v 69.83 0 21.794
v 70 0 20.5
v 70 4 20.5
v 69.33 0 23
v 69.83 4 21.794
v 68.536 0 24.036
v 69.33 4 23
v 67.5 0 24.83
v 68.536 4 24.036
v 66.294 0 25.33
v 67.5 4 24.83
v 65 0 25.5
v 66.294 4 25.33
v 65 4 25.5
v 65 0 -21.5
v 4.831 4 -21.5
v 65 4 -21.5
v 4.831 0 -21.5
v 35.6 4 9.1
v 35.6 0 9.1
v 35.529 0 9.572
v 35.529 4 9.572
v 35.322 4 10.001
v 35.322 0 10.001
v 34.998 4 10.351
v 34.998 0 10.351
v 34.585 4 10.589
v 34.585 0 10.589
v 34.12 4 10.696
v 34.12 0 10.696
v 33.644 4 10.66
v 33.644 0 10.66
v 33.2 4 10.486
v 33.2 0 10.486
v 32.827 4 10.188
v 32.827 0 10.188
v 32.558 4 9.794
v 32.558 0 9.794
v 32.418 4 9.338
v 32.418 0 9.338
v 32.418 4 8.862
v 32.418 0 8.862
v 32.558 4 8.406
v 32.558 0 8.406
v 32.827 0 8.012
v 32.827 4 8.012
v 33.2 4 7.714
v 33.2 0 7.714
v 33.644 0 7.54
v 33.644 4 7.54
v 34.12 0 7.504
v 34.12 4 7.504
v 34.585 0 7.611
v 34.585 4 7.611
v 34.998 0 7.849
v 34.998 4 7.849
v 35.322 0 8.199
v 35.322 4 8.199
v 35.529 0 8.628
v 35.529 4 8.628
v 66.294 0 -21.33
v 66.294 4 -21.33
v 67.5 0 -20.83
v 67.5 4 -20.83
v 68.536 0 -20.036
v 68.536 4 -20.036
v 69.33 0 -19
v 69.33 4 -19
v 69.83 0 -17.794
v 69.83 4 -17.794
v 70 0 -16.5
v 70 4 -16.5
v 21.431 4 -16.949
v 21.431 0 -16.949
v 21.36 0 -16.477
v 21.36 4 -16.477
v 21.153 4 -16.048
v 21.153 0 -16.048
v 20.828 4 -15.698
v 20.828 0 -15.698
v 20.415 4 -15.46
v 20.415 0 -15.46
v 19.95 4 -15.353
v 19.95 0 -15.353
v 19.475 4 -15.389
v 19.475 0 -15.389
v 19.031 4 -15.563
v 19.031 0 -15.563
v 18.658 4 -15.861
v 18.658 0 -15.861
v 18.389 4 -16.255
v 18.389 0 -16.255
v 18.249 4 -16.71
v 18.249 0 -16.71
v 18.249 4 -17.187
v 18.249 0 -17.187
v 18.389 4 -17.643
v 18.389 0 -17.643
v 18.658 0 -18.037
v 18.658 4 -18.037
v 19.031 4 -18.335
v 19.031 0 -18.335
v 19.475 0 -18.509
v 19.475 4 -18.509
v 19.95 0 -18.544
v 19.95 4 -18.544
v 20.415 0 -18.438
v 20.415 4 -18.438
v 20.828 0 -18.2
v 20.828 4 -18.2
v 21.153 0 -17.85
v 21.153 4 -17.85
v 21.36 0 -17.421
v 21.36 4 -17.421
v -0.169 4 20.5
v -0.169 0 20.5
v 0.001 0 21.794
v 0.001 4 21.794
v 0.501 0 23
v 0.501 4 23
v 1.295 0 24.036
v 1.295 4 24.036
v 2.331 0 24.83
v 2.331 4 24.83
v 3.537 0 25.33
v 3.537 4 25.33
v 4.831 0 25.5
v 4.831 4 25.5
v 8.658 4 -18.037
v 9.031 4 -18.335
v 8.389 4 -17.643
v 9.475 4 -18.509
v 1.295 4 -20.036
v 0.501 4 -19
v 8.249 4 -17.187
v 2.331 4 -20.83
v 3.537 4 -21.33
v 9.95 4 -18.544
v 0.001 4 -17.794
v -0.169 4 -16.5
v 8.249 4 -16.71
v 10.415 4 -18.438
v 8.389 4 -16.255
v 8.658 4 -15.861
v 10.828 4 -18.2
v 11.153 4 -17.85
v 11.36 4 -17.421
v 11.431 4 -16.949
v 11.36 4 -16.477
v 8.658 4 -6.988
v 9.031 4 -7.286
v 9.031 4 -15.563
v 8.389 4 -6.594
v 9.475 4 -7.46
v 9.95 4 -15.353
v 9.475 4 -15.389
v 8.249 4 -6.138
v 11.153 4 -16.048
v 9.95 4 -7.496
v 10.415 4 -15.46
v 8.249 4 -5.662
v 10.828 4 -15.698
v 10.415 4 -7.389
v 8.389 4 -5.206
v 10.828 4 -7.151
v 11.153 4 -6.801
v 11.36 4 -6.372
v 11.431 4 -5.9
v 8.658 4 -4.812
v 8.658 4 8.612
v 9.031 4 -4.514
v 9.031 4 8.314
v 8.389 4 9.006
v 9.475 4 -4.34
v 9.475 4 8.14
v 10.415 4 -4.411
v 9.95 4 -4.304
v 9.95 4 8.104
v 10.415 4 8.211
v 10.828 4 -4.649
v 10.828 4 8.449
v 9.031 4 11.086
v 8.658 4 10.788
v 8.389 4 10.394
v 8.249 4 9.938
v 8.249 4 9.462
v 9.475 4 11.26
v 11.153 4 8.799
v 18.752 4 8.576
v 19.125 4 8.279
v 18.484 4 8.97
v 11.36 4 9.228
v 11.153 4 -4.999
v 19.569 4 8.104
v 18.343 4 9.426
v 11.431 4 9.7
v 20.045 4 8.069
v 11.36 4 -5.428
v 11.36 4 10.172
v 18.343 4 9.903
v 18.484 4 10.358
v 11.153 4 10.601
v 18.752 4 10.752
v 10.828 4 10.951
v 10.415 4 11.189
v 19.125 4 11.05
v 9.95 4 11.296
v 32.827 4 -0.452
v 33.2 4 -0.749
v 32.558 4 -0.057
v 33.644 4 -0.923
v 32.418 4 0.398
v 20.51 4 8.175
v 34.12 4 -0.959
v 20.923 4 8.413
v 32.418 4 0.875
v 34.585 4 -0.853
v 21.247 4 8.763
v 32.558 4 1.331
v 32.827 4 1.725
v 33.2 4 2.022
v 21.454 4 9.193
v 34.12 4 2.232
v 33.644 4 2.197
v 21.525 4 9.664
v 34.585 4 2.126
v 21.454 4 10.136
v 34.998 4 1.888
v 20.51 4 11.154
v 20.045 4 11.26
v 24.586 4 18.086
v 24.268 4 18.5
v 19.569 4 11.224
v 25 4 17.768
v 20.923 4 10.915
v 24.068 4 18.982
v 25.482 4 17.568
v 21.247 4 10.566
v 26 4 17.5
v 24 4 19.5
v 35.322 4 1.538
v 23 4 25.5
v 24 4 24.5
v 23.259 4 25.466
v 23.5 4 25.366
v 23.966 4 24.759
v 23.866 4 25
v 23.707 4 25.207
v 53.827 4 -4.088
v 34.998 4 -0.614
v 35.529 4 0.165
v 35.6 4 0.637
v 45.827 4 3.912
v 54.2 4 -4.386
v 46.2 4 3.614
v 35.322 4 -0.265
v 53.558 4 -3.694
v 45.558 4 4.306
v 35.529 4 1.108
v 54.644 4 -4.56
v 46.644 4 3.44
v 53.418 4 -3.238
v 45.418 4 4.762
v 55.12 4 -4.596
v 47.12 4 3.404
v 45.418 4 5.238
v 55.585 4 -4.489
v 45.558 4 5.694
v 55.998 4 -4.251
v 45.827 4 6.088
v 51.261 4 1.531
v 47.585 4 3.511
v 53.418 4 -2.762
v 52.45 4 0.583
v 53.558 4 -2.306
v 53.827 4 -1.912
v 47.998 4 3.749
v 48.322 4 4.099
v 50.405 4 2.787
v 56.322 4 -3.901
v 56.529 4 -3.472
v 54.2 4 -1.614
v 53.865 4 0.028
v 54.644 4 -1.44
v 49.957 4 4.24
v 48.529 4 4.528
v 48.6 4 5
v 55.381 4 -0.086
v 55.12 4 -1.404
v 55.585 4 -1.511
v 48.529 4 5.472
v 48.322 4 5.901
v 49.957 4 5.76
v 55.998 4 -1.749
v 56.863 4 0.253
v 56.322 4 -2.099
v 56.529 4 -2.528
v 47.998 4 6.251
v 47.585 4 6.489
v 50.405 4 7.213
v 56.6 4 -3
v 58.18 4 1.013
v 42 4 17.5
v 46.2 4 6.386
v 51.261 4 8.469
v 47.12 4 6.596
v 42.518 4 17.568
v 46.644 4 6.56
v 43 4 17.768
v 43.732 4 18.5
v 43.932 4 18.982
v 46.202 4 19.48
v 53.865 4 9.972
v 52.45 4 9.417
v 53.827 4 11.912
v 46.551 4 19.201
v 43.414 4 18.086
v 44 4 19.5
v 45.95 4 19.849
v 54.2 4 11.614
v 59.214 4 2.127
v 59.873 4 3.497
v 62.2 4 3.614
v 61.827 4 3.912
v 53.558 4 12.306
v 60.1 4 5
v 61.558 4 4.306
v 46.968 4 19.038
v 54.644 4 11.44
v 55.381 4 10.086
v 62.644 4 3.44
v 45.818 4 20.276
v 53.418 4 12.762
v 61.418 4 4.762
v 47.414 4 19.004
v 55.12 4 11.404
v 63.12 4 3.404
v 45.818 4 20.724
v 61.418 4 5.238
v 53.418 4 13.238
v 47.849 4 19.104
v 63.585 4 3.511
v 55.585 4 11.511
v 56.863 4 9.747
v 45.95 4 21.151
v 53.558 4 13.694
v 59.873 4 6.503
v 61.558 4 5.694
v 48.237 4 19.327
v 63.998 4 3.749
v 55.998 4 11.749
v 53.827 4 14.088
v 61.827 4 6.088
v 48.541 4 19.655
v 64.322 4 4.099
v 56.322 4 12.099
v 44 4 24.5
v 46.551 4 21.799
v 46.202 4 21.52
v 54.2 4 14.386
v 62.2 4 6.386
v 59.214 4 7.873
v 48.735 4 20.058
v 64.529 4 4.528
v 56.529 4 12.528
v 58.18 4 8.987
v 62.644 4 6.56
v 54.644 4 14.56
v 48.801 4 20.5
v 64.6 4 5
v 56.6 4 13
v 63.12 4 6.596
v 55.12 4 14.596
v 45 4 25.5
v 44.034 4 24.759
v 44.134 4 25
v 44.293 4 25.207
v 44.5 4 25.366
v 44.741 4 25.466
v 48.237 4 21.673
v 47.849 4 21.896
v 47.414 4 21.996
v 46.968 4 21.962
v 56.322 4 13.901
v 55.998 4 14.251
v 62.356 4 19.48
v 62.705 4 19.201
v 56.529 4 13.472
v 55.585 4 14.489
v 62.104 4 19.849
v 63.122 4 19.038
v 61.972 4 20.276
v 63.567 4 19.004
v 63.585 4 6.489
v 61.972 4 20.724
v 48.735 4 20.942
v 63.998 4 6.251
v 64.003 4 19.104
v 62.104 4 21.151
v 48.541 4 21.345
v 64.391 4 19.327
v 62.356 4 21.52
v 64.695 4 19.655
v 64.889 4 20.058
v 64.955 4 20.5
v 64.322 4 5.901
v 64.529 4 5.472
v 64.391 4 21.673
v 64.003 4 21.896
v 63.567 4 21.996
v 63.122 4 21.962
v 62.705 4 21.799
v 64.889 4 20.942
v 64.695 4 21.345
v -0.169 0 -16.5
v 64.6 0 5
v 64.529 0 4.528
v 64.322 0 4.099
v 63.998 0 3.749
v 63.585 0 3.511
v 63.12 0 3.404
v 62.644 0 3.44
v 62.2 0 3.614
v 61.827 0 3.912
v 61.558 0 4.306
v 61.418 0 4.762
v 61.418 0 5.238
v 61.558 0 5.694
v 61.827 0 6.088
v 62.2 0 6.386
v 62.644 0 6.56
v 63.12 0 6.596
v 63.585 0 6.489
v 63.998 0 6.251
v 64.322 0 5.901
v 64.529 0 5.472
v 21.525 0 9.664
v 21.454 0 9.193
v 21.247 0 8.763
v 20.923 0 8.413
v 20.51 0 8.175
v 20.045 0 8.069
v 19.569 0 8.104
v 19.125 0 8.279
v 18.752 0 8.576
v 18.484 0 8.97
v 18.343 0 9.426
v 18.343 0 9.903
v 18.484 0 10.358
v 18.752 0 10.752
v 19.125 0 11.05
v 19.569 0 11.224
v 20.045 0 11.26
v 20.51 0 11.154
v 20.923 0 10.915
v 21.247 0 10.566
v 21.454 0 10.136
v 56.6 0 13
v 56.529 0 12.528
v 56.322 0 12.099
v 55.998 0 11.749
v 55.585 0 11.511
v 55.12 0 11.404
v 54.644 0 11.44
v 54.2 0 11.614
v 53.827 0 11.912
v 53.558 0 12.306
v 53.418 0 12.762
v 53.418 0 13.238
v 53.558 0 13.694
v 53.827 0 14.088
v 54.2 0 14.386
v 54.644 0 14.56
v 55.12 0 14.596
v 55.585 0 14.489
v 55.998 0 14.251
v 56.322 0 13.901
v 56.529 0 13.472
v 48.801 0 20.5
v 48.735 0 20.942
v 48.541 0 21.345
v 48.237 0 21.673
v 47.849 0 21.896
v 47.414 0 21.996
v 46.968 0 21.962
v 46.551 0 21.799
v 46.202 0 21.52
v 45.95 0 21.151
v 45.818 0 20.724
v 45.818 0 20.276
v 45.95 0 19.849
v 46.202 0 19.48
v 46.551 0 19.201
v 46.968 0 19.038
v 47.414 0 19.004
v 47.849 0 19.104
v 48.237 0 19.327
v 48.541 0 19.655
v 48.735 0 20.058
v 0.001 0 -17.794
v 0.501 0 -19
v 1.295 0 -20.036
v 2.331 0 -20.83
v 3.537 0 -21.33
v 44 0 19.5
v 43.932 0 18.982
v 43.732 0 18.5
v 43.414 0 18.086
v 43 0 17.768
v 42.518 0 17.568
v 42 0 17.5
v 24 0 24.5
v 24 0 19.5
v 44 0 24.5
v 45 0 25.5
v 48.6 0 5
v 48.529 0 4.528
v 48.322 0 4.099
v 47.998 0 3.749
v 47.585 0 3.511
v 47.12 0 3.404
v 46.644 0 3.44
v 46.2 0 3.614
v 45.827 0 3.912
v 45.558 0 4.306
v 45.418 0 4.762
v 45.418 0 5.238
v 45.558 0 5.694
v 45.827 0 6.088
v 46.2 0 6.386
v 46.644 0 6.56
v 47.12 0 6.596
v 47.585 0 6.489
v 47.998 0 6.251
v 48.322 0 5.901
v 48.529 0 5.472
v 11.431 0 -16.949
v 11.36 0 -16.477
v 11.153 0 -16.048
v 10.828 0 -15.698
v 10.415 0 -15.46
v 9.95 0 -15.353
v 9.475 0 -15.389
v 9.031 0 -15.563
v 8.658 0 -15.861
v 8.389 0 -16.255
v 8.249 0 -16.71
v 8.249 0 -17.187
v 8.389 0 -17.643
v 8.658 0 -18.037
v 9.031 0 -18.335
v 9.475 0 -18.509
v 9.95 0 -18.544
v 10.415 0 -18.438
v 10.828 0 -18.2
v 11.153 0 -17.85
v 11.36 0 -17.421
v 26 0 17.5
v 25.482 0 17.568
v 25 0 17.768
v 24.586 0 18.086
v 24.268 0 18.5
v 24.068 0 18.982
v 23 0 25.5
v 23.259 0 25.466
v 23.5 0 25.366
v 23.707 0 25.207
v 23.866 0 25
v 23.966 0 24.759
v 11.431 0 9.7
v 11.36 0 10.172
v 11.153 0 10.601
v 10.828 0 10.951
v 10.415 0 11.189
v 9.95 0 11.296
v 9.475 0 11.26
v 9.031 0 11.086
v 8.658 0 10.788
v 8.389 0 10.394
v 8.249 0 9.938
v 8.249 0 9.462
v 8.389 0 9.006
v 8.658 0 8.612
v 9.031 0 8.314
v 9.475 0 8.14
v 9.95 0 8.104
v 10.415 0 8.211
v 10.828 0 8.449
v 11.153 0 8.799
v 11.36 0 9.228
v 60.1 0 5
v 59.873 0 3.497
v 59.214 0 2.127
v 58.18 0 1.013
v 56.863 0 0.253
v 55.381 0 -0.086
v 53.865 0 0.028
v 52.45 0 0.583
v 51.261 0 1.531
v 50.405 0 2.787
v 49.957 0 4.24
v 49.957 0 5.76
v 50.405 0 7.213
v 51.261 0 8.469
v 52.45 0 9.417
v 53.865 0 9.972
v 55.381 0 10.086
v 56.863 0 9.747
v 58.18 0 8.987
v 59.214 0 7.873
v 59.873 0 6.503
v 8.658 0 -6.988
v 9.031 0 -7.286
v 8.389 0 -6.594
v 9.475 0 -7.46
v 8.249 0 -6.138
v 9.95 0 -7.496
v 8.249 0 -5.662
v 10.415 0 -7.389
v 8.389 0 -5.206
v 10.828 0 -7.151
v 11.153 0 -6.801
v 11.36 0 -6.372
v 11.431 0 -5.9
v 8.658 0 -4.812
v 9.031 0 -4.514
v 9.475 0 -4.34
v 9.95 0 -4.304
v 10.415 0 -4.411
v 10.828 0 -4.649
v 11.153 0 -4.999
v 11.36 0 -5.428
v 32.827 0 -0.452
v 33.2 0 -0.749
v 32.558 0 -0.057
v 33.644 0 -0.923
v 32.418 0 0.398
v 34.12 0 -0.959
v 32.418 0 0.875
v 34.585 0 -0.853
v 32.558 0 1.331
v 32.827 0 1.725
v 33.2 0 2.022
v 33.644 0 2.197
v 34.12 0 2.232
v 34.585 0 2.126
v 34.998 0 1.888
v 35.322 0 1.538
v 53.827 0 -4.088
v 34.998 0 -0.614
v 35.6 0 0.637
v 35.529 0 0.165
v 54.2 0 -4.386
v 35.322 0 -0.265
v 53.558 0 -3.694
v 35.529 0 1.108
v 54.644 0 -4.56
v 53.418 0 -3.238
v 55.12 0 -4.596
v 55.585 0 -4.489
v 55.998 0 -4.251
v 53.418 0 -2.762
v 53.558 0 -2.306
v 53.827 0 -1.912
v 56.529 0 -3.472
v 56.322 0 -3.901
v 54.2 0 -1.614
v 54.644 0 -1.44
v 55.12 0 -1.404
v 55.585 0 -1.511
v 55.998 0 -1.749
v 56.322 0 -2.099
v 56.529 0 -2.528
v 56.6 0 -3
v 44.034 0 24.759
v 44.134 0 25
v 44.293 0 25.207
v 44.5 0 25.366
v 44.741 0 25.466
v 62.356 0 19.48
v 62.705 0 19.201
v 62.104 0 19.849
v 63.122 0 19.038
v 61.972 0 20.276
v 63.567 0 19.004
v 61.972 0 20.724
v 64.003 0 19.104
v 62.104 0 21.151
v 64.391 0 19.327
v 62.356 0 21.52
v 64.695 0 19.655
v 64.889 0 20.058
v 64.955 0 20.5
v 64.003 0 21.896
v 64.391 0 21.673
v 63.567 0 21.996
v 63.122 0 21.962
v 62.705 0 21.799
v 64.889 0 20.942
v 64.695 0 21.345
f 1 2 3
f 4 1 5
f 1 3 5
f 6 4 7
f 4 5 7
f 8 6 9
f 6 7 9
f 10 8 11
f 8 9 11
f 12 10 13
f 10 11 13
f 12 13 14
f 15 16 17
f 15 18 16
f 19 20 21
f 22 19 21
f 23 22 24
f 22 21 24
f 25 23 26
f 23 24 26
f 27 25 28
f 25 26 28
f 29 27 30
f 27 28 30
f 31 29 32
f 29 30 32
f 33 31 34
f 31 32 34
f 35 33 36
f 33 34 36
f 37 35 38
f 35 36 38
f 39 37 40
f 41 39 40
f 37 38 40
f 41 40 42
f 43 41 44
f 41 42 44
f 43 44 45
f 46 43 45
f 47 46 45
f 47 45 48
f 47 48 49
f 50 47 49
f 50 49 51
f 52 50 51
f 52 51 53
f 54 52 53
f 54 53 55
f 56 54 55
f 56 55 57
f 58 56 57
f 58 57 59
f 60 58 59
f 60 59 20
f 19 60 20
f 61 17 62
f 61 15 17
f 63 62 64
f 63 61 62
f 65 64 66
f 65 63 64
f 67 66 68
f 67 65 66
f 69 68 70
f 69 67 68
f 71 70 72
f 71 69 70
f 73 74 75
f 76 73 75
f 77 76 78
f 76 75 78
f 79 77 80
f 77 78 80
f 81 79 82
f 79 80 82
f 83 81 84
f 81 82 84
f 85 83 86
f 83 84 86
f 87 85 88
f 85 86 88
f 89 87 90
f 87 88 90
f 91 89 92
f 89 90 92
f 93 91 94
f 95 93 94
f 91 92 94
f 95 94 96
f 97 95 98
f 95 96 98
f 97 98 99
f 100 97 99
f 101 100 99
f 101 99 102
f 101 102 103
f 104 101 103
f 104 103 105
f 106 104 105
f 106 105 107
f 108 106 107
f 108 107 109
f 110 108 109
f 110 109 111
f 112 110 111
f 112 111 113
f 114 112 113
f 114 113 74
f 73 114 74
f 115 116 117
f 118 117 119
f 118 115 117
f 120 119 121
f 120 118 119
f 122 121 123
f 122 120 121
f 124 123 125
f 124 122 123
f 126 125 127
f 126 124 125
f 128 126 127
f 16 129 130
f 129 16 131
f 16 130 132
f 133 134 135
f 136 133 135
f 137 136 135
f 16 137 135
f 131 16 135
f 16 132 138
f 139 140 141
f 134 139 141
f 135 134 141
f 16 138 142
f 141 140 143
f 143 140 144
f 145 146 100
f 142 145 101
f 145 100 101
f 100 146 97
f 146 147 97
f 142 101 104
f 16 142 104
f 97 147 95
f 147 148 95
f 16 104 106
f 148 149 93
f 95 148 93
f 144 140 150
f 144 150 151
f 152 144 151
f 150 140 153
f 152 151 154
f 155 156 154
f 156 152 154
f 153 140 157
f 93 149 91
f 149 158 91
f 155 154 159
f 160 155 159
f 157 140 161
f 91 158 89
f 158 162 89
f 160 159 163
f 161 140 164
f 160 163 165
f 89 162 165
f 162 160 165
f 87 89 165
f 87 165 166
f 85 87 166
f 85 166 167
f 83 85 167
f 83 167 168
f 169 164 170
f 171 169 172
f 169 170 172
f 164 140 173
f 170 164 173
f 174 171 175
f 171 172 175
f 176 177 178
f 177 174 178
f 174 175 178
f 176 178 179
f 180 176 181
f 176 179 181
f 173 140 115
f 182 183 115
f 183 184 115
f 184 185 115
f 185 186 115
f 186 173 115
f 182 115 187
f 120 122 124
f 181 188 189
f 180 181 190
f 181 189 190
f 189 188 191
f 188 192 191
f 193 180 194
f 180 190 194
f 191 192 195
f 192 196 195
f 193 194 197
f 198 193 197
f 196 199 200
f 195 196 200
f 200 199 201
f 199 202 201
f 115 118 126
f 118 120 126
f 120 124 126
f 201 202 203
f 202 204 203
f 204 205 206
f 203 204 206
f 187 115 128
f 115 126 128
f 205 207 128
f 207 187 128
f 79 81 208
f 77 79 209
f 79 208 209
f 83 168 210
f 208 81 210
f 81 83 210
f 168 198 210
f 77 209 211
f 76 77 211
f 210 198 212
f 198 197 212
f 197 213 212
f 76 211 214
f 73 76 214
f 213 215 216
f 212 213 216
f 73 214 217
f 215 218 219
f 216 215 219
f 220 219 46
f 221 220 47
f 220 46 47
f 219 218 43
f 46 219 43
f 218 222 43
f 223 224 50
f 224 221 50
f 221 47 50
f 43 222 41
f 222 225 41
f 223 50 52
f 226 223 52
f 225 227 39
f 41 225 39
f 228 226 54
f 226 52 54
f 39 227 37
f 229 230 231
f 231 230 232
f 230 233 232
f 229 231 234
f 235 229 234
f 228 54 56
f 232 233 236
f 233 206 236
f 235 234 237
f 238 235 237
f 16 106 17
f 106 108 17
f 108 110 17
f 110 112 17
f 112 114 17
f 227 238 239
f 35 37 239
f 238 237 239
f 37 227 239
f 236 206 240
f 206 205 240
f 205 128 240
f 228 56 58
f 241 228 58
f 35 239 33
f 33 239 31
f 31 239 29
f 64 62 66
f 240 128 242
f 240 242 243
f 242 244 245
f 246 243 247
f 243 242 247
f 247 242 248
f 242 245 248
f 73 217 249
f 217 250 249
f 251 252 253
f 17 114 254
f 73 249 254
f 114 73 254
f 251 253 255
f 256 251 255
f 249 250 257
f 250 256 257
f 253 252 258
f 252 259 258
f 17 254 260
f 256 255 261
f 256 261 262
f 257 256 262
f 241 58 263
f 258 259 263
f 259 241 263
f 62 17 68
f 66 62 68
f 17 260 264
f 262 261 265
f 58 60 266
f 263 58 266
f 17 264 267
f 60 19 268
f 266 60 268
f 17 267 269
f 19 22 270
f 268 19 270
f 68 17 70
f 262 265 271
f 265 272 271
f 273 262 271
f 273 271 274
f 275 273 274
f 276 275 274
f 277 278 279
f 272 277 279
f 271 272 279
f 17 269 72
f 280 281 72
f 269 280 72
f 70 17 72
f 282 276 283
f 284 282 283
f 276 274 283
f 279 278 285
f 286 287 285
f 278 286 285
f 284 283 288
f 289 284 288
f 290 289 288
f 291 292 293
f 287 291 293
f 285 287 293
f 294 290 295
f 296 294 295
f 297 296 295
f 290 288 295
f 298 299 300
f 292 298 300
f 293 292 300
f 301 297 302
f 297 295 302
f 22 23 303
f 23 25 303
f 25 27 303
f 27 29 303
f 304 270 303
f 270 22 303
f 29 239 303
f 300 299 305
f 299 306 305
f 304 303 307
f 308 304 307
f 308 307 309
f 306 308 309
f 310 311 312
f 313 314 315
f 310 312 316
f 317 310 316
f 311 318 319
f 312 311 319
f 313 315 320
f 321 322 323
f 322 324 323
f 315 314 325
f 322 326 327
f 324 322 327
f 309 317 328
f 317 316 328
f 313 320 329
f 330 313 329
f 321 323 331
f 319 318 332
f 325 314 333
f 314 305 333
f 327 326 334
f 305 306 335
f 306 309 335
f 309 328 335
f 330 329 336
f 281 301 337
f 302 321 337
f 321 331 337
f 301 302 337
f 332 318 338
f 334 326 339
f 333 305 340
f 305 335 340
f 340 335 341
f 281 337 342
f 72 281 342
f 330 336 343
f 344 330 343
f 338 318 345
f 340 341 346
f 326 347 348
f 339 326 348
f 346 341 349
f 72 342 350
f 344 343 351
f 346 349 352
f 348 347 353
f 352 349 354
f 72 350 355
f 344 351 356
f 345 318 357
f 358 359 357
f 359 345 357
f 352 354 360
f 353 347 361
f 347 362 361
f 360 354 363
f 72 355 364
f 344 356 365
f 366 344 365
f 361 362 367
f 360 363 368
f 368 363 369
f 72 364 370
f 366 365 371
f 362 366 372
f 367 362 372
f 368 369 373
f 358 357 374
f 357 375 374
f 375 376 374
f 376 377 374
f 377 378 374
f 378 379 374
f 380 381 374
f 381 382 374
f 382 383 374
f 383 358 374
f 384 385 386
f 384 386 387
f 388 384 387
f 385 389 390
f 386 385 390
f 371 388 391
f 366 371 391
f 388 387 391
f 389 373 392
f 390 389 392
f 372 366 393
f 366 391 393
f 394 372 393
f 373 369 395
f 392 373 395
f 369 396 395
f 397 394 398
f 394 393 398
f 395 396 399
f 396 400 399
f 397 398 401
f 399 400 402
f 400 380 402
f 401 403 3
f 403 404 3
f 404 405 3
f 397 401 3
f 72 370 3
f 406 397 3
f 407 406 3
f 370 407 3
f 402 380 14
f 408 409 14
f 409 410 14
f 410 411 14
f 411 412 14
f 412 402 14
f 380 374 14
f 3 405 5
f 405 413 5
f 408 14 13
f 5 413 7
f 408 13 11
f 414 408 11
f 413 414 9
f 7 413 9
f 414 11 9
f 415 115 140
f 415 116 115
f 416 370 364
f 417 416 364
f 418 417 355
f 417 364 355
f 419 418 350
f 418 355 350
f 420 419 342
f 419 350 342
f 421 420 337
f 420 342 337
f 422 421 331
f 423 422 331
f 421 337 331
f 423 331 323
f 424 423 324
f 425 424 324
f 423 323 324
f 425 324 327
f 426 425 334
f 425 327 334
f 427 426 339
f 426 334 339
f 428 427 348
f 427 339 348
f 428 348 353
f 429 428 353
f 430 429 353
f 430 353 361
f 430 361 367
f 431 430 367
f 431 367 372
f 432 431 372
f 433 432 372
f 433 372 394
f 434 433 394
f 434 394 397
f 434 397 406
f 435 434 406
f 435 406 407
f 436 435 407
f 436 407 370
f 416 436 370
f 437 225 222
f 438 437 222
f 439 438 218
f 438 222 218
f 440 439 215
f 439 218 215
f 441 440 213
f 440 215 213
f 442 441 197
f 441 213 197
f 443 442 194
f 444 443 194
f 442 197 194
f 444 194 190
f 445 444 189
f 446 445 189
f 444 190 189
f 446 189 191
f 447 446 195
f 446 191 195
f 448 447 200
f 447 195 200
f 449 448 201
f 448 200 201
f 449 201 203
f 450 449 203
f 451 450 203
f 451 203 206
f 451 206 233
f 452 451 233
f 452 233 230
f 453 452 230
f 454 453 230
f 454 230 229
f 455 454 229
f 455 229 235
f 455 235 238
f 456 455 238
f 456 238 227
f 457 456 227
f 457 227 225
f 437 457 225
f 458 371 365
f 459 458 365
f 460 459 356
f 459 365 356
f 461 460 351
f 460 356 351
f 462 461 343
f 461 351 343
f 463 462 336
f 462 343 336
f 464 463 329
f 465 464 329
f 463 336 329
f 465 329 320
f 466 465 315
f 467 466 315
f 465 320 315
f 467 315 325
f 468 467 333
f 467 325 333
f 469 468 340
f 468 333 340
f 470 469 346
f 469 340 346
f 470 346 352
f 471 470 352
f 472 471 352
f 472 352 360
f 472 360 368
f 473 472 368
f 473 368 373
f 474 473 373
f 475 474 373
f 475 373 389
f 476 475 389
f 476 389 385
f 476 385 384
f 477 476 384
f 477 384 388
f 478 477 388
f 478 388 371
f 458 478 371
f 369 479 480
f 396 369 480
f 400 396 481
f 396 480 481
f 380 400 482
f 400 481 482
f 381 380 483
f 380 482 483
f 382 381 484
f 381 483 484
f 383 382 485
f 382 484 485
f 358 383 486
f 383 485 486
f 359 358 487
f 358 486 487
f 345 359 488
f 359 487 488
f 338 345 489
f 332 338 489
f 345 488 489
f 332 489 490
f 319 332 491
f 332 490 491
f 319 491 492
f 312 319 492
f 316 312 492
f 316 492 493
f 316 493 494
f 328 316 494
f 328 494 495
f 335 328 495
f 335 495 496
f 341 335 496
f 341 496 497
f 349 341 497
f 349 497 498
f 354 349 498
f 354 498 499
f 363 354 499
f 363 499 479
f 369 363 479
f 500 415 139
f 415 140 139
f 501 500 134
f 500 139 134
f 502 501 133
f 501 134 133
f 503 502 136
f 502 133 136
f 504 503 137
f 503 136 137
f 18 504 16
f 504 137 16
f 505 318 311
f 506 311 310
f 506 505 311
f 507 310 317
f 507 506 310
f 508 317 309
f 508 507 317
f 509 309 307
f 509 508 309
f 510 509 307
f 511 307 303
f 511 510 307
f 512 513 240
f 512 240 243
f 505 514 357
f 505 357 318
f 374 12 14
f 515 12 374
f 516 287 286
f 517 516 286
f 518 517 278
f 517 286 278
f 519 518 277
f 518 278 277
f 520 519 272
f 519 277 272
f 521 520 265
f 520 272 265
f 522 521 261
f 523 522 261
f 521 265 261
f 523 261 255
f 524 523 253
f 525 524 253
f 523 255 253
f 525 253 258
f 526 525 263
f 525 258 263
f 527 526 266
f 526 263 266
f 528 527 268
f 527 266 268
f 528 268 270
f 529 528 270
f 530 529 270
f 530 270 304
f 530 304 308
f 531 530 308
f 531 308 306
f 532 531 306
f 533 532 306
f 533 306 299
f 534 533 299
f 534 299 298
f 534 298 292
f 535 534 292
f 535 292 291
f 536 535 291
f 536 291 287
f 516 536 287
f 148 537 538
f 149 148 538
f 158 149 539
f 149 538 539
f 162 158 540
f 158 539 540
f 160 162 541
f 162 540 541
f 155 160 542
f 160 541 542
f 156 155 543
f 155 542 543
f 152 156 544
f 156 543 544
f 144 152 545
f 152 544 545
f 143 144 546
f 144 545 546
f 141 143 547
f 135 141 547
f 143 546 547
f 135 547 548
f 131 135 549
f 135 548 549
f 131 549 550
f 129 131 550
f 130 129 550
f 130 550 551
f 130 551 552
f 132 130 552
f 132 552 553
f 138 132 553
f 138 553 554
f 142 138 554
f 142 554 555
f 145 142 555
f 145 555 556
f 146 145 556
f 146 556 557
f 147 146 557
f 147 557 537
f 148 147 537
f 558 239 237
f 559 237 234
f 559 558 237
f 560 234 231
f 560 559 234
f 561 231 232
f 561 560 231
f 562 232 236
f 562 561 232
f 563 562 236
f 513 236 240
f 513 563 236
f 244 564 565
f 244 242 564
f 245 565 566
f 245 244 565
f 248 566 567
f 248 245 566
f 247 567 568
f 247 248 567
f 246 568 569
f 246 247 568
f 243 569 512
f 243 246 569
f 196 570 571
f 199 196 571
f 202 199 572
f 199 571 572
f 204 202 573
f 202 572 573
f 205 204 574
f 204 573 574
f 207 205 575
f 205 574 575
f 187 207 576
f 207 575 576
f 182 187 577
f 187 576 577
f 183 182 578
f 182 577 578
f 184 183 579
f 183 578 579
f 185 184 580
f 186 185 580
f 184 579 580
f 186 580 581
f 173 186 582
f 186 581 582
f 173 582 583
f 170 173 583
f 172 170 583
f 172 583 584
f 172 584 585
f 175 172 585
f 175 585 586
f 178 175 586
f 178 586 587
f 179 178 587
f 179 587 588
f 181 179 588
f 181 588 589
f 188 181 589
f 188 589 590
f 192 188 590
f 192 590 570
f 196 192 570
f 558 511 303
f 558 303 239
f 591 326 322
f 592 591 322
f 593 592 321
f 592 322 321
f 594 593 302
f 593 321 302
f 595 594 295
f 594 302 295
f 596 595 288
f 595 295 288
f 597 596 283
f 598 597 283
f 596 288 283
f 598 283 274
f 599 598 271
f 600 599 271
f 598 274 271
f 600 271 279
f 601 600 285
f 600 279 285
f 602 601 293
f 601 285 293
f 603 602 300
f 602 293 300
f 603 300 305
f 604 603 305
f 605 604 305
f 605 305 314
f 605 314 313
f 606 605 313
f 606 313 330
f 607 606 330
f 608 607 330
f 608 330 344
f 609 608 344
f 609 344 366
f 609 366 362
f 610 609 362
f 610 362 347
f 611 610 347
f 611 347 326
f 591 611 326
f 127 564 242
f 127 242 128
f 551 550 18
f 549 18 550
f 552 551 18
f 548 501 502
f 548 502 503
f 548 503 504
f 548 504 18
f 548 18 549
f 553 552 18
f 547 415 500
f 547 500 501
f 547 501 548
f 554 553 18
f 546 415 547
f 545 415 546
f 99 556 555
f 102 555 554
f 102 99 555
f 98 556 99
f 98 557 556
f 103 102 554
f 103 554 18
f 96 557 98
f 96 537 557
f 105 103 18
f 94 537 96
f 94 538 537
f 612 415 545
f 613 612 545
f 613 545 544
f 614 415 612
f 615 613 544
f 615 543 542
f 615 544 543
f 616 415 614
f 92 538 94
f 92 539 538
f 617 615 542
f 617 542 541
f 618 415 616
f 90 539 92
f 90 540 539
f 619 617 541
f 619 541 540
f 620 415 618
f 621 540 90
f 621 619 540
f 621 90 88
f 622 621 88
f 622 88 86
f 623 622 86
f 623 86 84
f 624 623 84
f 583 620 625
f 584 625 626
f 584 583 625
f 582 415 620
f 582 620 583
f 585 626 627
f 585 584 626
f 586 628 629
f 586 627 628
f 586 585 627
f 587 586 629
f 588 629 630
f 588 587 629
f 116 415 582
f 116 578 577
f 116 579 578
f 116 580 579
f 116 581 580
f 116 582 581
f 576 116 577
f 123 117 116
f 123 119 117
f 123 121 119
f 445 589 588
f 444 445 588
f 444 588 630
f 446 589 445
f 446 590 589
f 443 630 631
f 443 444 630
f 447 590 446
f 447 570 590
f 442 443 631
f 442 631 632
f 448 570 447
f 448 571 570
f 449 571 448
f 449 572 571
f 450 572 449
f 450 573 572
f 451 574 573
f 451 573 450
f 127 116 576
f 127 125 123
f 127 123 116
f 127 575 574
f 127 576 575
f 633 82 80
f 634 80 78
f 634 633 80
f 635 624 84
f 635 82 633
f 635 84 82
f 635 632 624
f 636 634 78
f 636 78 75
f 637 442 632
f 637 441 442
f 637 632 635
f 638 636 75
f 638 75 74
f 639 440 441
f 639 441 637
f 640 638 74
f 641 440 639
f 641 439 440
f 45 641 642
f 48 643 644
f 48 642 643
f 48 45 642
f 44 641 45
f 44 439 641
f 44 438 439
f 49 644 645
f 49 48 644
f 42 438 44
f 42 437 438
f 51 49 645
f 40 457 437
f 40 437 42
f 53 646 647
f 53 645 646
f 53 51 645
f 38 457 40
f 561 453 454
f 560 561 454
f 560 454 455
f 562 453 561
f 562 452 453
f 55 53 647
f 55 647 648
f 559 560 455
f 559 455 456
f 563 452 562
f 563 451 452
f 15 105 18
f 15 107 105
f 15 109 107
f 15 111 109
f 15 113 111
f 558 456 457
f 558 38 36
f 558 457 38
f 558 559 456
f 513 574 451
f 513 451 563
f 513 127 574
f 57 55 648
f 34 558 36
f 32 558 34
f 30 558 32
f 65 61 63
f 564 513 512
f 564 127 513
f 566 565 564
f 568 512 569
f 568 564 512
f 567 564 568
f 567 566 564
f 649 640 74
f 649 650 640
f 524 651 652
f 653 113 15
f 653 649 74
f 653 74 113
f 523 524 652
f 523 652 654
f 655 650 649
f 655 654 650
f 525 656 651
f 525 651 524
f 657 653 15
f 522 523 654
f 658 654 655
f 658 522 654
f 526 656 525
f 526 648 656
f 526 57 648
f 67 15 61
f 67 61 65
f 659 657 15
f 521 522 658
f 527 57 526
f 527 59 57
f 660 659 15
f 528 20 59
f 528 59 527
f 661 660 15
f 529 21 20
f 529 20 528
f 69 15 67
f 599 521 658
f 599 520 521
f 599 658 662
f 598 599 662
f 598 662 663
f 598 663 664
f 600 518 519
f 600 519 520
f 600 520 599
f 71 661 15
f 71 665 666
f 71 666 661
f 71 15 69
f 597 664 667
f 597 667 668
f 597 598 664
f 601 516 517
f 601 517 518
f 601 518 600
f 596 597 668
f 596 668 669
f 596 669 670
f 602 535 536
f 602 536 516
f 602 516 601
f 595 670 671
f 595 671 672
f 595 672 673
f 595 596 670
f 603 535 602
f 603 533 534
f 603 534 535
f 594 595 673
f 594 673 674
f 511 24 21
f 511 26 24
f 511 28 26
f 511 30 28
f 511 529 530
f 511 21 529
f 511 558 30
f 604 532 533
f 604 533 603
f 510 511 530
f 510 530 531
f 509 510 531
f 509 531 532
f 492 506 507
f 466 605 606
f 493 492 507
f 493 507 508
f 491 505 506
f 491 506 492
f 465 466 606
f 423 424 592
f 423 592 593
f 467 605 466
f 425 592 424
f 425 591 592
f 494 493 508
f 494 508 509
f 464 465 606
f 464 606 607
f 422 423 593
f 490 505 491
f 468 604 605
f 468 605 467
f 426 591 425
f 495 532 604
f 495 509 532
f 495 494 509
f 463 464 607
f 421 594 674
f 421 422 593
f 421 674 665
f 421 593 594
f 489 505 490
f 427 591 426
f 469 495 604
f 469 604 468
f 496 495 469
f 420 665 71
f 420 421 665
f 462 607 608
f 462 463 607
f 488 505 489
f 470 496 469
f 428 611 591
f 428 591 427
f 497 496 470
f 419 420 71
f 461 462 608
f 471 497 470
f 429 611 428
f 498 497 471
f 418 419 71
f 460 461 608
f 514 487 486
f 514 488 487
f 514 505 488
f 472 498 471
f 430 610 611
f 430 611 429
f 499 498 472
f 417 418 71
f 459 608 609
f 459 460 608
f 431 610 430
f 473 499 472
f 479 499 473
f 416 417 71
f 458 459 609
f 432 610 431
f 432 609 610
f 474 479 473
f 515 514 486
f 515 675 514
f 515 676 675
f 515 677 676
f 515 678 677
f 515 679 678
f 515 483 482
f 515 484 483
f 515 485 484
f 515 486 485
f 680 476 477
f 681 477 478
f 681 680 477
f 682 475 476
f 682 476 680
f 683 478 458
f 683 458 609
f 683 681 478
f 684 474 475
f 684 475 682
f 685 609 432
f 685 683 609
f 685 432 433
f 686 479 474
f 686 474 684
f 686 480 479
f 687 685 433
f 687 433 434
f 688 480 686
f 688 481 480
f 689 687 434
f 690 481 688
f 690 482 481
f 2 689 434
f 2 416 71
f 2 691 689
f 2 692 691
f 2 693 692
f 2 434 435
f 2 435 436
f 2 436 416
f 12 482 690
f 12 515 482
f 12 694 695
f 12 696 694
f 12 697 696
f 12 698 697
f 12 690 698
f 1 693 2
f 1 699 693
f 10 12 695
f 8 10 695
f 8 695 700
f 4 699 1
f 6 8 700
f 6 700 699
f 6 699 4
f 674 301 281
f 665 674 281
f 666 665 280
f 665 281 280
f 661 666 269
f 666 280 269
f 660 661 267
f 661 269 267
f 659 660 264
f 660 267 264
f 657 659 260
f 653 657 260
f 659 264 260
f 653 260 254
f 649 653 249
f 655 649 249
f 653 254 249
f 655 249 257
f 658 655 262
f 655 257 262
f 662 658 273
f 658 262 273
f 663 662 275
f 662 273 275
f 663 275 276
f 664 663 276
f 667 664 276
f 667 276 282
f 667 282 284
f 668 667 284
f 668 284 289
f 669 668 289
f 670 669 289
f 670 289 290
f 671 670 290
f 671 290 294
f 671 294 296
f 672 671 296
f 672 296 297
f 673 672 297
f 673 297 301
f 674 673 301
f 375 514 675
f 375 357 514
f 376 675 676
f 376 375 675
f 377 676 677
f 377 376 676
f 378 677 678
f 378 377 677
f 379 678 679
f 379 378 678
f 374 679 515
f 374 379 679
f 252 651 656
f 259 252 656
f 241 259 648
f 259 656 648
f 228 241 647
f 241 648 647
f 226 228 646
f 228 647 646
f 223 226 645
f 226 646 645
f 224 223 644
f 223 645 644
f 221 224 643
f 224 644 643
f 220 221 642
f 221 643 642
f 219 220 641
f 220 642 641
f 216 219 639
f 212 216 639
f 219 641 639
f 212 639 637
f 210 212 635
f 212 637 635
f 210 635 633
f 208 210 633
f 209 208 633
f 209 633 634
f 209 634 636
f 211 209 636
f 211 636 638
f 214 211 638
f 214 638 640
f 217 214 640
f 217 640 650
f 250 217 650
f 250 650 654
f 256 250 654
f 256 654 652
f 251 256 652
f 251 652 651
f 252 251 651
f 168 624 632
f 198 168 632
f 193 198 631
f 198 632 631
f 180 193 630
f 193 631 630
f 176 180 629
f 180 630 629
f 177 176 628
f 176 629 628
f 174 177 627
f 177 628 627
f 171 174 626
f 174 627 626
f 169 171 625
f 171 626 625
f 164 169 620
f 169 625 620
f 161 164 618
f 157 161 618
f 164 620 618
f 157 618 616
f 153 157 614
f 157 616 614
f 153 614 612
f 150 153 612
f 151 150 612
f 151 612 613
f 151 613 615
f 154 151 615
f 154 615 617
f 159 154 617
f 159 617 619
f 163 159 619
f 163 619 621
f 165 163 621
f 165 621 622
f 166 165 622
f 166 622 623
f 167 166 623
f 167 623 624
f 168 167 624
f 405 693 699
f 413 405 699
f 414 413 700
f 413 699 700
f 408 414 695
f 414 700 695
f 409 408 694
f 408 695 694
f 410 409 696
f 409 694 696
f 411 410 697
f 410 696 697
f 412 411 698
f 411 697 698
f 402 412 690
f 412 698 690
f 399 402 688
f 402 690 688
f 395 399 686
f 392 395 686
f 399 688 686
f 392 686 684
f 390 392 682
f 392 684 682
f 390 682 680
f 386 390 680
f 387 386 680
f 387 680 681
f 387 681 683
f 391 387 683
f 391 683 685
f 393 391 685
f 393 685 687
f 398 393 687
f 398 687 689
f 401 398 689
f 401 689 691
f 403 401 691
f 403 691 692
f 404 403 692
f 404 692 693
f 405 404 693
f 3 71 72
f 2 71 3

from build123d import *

# Parameters (mm, degrees)
SKETCH_1_W                = 180
SKETCH_1_H                = 43
EXTRUDE_335_DEPTH         = 4
SKETCH_2_R                = 5.1
SKETCH_2_R_2              = 1.6
CUT_EXTRUDE_616_DEPTH     = 5
SKETCH_10_W               = 20
SKETCH_10_H               = 43
CUT_EXTRUDE_3591_DEPTH    = 5
SKETCH_11_W               = 18
SKETCH_11_H               = 43
EXTRUDE_3904_DEPTH        = 4
SKETCH_12_W               = 40
SKETCH_12_H               = 13
CUT_EXTRUDE_3_DEPTH       = 10
SKETCH_14_R               = 1.6
CUT_EXTRUDE_4861_DEPTH    = 10
SKETCH_15_R               = 1.6
CUT_EXTRUDE_5298_DEPTH    = 5
PATTERN_LINEAR_5588_COUNT = 2
PATTERN_LINEAR_5588_PITCH = 29.8
CUT_EXTRUDE_6381_DEPTH    = 5
SKETCH_19_W               = 104
SKETCH_19_H               = 43
CUT_EXTRUDE_7034_DEPTH    = 5
FILLET_9_R                = 5
CUT_EXTRUDE_1_DEPTH       = 5
SKETCH_30_W               = 2
SKETCH_30_H               = 43
EXTRUDE_1_DEPTH           = 4
SKETCH_32_W               = 9
SKETCH_32_H               = 43
EXTRUDE_2_DEPTH           = 4
FILLET_11_R               = 5
EXTRUDE_3_DEPTH           = 4
FILLET_12_R               = 5
SKETCH_34_R               = 1.500000001
SKETCH_34_R_2             = 1.500000004
CUT_EXTRUDE_3_2_DEPTH     = 5
SKETCH_35_R               = 1.6
CUT_EXTRUDE_4_DEPTH       = 5
SKETCH_36_R               = 1.6
CUT_EXTRUDE_5_DEPTH       = 5
SKETCH_37_R               = 1.6
CUT_EXTRUDE_6_DEPTH       = 5
CUT_EXTRUDE_7_DEPTH       = 5
FILLET_15_R               = 1


with BuildPart() as part:
    # 草图1 → Extrude 335 (new body)
    with BuildSketch(Plane(origin=(0, 0, 0), x_dir=(1, 0, 0), z_dir=(0, 1, 0))):
        Rectangle(SKETCH_1_W, SKETCH_1_H)
    extrude(amount=EXTRUDE_335_DEPTH)

    # 草图2 → Cut-Extrude 616 (cut, through all)
    with BuildSketch(Plane(origin=(0, 4, 0), x_dir=(1, 0, 0), z_dir=(0, 1, 0))):
        with Locations((55, -5)):
            Circle(SKETCH_2_R)
        with Locations((63, -5)):
            Circle(SKETCH_2_R_2)
        with Locations((55, -13)):
            Circle(SKETCH_2_R_2)
        with Locations((47, -5)):
            Circle(SKETCH_2_R_2)
        with Locations((55, 3)):
            Circle(SKETCH_2_R_2)
    extrude(amount=-CUT_EXTRUDE_616_DEPTH, mode=Mode.SUBTRACT)

    # 草图10 → Cut-Extrude 3591 (cut, through all)
    with BuildSketch(Plane(origin=(0, 4, 0), x_dir=(1, 0, 0), z_dir=(0, 1, 0))):
        with Locations((80, 0)):
            Rectangle(SKETCH_10_W, SKETCH_10_H)
    extrude(amount=-CUT_EXTRUDE_3591_DEPTH, mode=Mode.SUBTRACT)

    # 草图11 → Extrude 3904 (add, through all)
    with BuildSketch(Plane(origin=(0, 4, 0), x_dir=(1, 0, 0), z_dir=(0, 1, 0))):
        with Locations((-99, 0)):
            Rectangle(SKETCH_11_W, SKETCH_11_H)
    extrude(amount=-EXTRUDE_3904_DEPTH)

    # 草图12 → Cut-Extrude 3 (cut)
    with BuildSketch(Plane(origin=(0, 4, 0), x_dir=(1, 0, 0), z_dir=(0, 1, 0))):
        with Locations((-88, -21.5)):
            Rectangle(SKETCH_12_W, SKETCH_12_H)
    extrude(amount=-CUT_EXTRUDE_3_DEPTH, mode=Mode.SUBTRACT)

    # 草图14 → Cut-Extrude 4861 (cut)
    with BuildSketch(Plane(origin=(0, 4, 0), x_dir=(1, 0, 0), z_dir=(0, 1, 0))):
        with Locations((46, -18.5)):
            Circle(SKETCH_14_R)
        with Locations((64, -18.5)):
            Circle(SKETCH_14_R)
    extrude(amount=-CUT_EXTRUDE_4861_DEPTH, mode=Mode.SUBTRACT)

    # 草图15 → Cut-Extrude 5298 (cut, through all)
    with BuildSketch(Plane(origin=(0, 4, 0), x_dir=(1, 0, 0), z_dir=(0, 1, 0))):
        with Locations((-102.9, 3.25)):
            Circle(SKETCH_15_R)
        with Locations((-73.1, 3.25)):
            Circle(SKETCH_15_R)
    extrude(amount=-CUT_EXTRUDE_5298_DEPTH, mode=Mode.SUBTRACT)

    # 草图16 → Cut-Revolve 5530 (revolve, cut)
    with BuildSketch(Plane.XY.offset(-3.25)):
        Polygon((-102.9, 0), (-99.7, 0), (-101.3, 1.6), (-102.9, 1.6), align=None)
    cut_revolve_5530 = revolve(axis=Axis((-102.9, -994.071718491, -3.25), (0, 1, 0)), mode=Mode.SUBTRACT)

    # Pattern Linear 5588: Cut-Revolve 5530 ×2
    with Locations(*[(i * PATTERN_LINEAR_5588_PITCH, 0, 0) for i in range(1, PATTERN_LINEAR_5588_COUNT)]):
        add(cut_revolve_5530, mode=Mode.SUBTRACT)

    # 草图17 → Cut-Extrude 6381 (cut, through all)
    with BuildSketch(Plane.XZ):
        with BuildLine():
            Line((-104.45, 3.75), (-101.35, 3.75))
            ThreePointArc((-101.35, 3.75), (-99.85, 5.25), (-101.35, 6.75))
            Line((-101.35, 6.75), (-101.35, 9.75))
            ThreePointArc((-101.35, 9.75), (-99.85, 11.25), (-101.35, 12.75))
            Line((-101.35, 12.75), (-104.45, 12.75))
            ThreePointArc((-104.45, 12.75), (-105.95, 11.25), (-104.45, 9.75))
            Line((-104.45, 9.75), (-104.45, 6.75))
            ThreePointArc((-104.45, 6.75), (-105.95, 5.25), (-104.45, 3.75))
        make_face()
        with BuildLine():
            Line((-104.45, -16.25), (-104.45, -13.25))
            ThreePointArc((-104.45, -13.25), (-105.95, -11.75), (-104.45, -10.25))
            Line((-104.45, -10.25), (-101.35, -10.25))
            ThreePointArc((-101.35, -10.25), (-99.85, -11.75), (-101.35, -13.25))
            Line((-101.35, -13.25), (-101.35, -16.25))
            ThreePointArc((-101.35, -16.25), (-99.85, -17.75), (-101.35, -19.25))
            Line((-101.35, -19.25), (-104.45, -19.25))
            ThreePointArc((-104.45, -19.25), (-105.95, -17.75), (-104.45, -16.25))
        make_face()
        with BuildLine():
            Line((-71.55, -16.25), (-71.55, -13.25))
            ThreePointArc((-71.55, -13.25), (-70.05, -11.75), (-71.55, -10.25))
            Line((-71.55, -10.25), (-74.65, -10.25))
            ThreePointArc((-74.65, -10.25), (-76.15, -11.75), (-74.65, -13.25))
            Line((-74.65, -13.25), (-74.65, -16.25))
            ThreePointArc((-74.65, -16.25), (-76.15, -17.75), (-74.65, -19.25))
            Line((-74.65, -19.25), (-71.55, -19.25))
            ThreePointArc((-71.55, -19.25), (-70.05, -17.75), (-71.55, -16.25))
        make_face()
        with BuildLine():
            Line((-71.55, 9.75), (-71.55, 6.75))
            ThreePointArc((-71.55, 6.75), (-70.05, 5.25), (-71.55, 3.75))
            Line((-71.55, 3.75), (-74.65, 3.75))
            ThreePointArc((-74.65, 3.75), (-76.15, 5.25), (-74.65, 6.75))
            Line((-74.65, 6.75), (-74.65, 9.75))
            ThreePointArc((-74.65, 9.75), (-76.15, 11.25), (-74.65, 12.75))
            Line((-74.65, 12.75), (-71.55, 12.75))
            ThreePointArc((-71.55, 12.75), (-70.05, 11.25), (-71.55, 9.75))
        make_face()
    extrude(amount=-CUT_EXTRUDE_6381_DEPTH, mode=Mode.SUBTRACT)

    # 草图19 → Cut-Extrude 7034 (cut, through all)
    with BuildSketch(Plane(origin=(0, 4, 0), x_dir=(1, 0, 0), z_dir=(0, 1, 0))):
        with Locations((-56, 0)):
            Rectangle(SKETCH_19_W, SKETCH_19_H)
    extrude(amount=-CUT_EXTRUDE_7034_DEPTH, mode=Mode.SUBTRACT)

    # 圆角9
    fillet_9_edges = [part.edges().sort_by_distance(p)[0] for p in [
        (-4, 2, 21.5),
        (-4, 2, -21.5),
        (70, 2, 21.5),
        (70, 2, -21.5),
    ]]
    fillet(fillet_9_edges, radius=FILLET_9_R)

    # 草图29 → Cut-Extrude 1 (cut, through all)
    with BuildSketch(Plane(origin=(0, 4, 0), x_dir=(1, 0, 0), z_dir=(0, 1, 0))):
        Polygon((1, 21.5), (10.830690118, 21.5), (10.830690118, -21.5), (1, -21.5), (-4.254253264, -21.5), (-4.254253264, 21.5), align=None)
    extrude(amount=-CUT_EXTRUDE_1_DEPTH, mode=Mode.SUBTRACT)

    # 草图30 → 凸台-拉伸1 (add)
    with BuildSketch(Plane(origin=(0, 4, 0), x_dir=(1, 0, 0), z_dir=(0, 1, 0))):
        with Locations((9.830690118, 0)):
            Rectangle(SKETCH_30_W, SKETCH_30_H)
    extrude(amount=-EXTRUDE_1_DEPTH)

    # 草图32 → Extrude 2 (add)
    with BuildSketch(Plane.XZ):
        with Locations((4.330690118, 0)):
            Rectangle(SKETCH_32_W, SKETCH_32_H)
    extrude(amount=-EXTRUDE_2_DEPTH)

    # 圆角11
    fillet_11_edges = [part.edges().sort_by_distance(p)[0] for p in [
        (-0.169309882, 2, -21.5),
        (-0.169309882, 2, 21.5),
    ]]
    fillet(fillet_11_edges, radius=FILLET_11_R)

    # 草图33 → 凸台-拉伸3 (add)
    with BuildSketch(Plane.XZ):
        Polygon((70, 16.5), (70, 25.500000005), (65, 25.500000005), (0, 25.500000005), (-0.169309882, 25.500000005), (-0.169309882, 16.5), align=None)
    extrude(amount=-EXTRUDE_3_DEPTH)

    # 圆角12
    fillet_12_edges = [part.edges().sort_by_distance(p)[0] for p in [
        (-0.169309882, 2, 25.500000005),
        (70, 2, 25.500000005),
    ]]
    fillet(fillet_12_edges, radius=FILLET_12_R)

    # 草图34 → Cut-Extrude 3 2 (cut, through all)
    with BuildSketch(Plane.XZ):
        with Locations((63.455393867, 20.5)):
            Circle(SKETCH_34_R)
        with Locations((47.301465353, 20.5)):
            Circle(SKETCH_34_R_2)
    extrude(amount=-CUT_EXTRUDE_3_2_DEPTH, mode=Mode.SUBTRACT)

    # 草图35 → 切除-拉伸4 (cut, through all)
    with BuildSketch(Plane.XZ):
        with Locations((34, 0.636740591)):
            Circle(SKETCH_35_R)
        with Locations((34, 9.1)):
            Circle(SKETCH_35_R)
    extrude(amount=-CUT_EXTRUDE_4_DEPTH, mode=Mode.SUBTRACT)

    # 草图36 → 切除-拉伸5 (cut, through all)
    with BuildSketch(Plane.XZ):
        with Locations((9.830690118, -5.9)):
            Circle(SKETCH_36_R)
        with Locations((9.830690118, 9.7)):
            Circle(SKETCH_36_R)
        with Locations((9.830690118, -16.948915218)):
            Circle(SKETCH_36_R)
        with Locations((19.830690118, -16.948915218)):
            Circle(SKETCH_36_R)
    extrude(amount=-CUT_EXTRUDE_5_DEPTH, mode=Mode.SUBTRACT)

    # 草图37 → 切除-拉伸6 (cut, through all)
    with BuildSketch(Plane(origin=(0, 4, 0), x_dir=(1, 0, 0), z_dir=(0, 1, 0))):
        with Locations((19.925091374, -9.664193429)):
            Circle(SKETCH_37_R)
    extrude(amount=-CUT_EXTRUDE_6_DEPTH, mode=Mode.SUBTRACT)

    # 草图38 → 切除-拉伸7 (cut, through all)
    with BuildSketch(Plane.XZ):
        with BuildLine():
            Line((44, 25.500000005), (44, 19.500000005))
            ThreePointArc((44, 19.500000005), (43.414213562, 18.085786442), (42, 17.500000005))
            Line((42, 17.500000005), (26, 17.500000005))
            ThreePointArc((26, 17.500000005), (24.585786438, 18.085786442), (24, 19.500000005))
            Line((24, 19.500000005), (24, 25.500000005))
            Line((24, 25.500000005), (44, 25.500000005))
        make_face()
    extrude(amount=-CUT_EXTRUDE_7_DEPTH, mode=Mode.SUBTRACT)

    # 圆角15
    fillet_15_edges = [part.edges().sort_by_distance(p)[0] for p in [
        (24, 2, 25.500000005),
        (44, 2, 25.500000005),
    ]]
    fillet(fillet_15_edges, radius=FILLET_15_R)


solid = part.part
